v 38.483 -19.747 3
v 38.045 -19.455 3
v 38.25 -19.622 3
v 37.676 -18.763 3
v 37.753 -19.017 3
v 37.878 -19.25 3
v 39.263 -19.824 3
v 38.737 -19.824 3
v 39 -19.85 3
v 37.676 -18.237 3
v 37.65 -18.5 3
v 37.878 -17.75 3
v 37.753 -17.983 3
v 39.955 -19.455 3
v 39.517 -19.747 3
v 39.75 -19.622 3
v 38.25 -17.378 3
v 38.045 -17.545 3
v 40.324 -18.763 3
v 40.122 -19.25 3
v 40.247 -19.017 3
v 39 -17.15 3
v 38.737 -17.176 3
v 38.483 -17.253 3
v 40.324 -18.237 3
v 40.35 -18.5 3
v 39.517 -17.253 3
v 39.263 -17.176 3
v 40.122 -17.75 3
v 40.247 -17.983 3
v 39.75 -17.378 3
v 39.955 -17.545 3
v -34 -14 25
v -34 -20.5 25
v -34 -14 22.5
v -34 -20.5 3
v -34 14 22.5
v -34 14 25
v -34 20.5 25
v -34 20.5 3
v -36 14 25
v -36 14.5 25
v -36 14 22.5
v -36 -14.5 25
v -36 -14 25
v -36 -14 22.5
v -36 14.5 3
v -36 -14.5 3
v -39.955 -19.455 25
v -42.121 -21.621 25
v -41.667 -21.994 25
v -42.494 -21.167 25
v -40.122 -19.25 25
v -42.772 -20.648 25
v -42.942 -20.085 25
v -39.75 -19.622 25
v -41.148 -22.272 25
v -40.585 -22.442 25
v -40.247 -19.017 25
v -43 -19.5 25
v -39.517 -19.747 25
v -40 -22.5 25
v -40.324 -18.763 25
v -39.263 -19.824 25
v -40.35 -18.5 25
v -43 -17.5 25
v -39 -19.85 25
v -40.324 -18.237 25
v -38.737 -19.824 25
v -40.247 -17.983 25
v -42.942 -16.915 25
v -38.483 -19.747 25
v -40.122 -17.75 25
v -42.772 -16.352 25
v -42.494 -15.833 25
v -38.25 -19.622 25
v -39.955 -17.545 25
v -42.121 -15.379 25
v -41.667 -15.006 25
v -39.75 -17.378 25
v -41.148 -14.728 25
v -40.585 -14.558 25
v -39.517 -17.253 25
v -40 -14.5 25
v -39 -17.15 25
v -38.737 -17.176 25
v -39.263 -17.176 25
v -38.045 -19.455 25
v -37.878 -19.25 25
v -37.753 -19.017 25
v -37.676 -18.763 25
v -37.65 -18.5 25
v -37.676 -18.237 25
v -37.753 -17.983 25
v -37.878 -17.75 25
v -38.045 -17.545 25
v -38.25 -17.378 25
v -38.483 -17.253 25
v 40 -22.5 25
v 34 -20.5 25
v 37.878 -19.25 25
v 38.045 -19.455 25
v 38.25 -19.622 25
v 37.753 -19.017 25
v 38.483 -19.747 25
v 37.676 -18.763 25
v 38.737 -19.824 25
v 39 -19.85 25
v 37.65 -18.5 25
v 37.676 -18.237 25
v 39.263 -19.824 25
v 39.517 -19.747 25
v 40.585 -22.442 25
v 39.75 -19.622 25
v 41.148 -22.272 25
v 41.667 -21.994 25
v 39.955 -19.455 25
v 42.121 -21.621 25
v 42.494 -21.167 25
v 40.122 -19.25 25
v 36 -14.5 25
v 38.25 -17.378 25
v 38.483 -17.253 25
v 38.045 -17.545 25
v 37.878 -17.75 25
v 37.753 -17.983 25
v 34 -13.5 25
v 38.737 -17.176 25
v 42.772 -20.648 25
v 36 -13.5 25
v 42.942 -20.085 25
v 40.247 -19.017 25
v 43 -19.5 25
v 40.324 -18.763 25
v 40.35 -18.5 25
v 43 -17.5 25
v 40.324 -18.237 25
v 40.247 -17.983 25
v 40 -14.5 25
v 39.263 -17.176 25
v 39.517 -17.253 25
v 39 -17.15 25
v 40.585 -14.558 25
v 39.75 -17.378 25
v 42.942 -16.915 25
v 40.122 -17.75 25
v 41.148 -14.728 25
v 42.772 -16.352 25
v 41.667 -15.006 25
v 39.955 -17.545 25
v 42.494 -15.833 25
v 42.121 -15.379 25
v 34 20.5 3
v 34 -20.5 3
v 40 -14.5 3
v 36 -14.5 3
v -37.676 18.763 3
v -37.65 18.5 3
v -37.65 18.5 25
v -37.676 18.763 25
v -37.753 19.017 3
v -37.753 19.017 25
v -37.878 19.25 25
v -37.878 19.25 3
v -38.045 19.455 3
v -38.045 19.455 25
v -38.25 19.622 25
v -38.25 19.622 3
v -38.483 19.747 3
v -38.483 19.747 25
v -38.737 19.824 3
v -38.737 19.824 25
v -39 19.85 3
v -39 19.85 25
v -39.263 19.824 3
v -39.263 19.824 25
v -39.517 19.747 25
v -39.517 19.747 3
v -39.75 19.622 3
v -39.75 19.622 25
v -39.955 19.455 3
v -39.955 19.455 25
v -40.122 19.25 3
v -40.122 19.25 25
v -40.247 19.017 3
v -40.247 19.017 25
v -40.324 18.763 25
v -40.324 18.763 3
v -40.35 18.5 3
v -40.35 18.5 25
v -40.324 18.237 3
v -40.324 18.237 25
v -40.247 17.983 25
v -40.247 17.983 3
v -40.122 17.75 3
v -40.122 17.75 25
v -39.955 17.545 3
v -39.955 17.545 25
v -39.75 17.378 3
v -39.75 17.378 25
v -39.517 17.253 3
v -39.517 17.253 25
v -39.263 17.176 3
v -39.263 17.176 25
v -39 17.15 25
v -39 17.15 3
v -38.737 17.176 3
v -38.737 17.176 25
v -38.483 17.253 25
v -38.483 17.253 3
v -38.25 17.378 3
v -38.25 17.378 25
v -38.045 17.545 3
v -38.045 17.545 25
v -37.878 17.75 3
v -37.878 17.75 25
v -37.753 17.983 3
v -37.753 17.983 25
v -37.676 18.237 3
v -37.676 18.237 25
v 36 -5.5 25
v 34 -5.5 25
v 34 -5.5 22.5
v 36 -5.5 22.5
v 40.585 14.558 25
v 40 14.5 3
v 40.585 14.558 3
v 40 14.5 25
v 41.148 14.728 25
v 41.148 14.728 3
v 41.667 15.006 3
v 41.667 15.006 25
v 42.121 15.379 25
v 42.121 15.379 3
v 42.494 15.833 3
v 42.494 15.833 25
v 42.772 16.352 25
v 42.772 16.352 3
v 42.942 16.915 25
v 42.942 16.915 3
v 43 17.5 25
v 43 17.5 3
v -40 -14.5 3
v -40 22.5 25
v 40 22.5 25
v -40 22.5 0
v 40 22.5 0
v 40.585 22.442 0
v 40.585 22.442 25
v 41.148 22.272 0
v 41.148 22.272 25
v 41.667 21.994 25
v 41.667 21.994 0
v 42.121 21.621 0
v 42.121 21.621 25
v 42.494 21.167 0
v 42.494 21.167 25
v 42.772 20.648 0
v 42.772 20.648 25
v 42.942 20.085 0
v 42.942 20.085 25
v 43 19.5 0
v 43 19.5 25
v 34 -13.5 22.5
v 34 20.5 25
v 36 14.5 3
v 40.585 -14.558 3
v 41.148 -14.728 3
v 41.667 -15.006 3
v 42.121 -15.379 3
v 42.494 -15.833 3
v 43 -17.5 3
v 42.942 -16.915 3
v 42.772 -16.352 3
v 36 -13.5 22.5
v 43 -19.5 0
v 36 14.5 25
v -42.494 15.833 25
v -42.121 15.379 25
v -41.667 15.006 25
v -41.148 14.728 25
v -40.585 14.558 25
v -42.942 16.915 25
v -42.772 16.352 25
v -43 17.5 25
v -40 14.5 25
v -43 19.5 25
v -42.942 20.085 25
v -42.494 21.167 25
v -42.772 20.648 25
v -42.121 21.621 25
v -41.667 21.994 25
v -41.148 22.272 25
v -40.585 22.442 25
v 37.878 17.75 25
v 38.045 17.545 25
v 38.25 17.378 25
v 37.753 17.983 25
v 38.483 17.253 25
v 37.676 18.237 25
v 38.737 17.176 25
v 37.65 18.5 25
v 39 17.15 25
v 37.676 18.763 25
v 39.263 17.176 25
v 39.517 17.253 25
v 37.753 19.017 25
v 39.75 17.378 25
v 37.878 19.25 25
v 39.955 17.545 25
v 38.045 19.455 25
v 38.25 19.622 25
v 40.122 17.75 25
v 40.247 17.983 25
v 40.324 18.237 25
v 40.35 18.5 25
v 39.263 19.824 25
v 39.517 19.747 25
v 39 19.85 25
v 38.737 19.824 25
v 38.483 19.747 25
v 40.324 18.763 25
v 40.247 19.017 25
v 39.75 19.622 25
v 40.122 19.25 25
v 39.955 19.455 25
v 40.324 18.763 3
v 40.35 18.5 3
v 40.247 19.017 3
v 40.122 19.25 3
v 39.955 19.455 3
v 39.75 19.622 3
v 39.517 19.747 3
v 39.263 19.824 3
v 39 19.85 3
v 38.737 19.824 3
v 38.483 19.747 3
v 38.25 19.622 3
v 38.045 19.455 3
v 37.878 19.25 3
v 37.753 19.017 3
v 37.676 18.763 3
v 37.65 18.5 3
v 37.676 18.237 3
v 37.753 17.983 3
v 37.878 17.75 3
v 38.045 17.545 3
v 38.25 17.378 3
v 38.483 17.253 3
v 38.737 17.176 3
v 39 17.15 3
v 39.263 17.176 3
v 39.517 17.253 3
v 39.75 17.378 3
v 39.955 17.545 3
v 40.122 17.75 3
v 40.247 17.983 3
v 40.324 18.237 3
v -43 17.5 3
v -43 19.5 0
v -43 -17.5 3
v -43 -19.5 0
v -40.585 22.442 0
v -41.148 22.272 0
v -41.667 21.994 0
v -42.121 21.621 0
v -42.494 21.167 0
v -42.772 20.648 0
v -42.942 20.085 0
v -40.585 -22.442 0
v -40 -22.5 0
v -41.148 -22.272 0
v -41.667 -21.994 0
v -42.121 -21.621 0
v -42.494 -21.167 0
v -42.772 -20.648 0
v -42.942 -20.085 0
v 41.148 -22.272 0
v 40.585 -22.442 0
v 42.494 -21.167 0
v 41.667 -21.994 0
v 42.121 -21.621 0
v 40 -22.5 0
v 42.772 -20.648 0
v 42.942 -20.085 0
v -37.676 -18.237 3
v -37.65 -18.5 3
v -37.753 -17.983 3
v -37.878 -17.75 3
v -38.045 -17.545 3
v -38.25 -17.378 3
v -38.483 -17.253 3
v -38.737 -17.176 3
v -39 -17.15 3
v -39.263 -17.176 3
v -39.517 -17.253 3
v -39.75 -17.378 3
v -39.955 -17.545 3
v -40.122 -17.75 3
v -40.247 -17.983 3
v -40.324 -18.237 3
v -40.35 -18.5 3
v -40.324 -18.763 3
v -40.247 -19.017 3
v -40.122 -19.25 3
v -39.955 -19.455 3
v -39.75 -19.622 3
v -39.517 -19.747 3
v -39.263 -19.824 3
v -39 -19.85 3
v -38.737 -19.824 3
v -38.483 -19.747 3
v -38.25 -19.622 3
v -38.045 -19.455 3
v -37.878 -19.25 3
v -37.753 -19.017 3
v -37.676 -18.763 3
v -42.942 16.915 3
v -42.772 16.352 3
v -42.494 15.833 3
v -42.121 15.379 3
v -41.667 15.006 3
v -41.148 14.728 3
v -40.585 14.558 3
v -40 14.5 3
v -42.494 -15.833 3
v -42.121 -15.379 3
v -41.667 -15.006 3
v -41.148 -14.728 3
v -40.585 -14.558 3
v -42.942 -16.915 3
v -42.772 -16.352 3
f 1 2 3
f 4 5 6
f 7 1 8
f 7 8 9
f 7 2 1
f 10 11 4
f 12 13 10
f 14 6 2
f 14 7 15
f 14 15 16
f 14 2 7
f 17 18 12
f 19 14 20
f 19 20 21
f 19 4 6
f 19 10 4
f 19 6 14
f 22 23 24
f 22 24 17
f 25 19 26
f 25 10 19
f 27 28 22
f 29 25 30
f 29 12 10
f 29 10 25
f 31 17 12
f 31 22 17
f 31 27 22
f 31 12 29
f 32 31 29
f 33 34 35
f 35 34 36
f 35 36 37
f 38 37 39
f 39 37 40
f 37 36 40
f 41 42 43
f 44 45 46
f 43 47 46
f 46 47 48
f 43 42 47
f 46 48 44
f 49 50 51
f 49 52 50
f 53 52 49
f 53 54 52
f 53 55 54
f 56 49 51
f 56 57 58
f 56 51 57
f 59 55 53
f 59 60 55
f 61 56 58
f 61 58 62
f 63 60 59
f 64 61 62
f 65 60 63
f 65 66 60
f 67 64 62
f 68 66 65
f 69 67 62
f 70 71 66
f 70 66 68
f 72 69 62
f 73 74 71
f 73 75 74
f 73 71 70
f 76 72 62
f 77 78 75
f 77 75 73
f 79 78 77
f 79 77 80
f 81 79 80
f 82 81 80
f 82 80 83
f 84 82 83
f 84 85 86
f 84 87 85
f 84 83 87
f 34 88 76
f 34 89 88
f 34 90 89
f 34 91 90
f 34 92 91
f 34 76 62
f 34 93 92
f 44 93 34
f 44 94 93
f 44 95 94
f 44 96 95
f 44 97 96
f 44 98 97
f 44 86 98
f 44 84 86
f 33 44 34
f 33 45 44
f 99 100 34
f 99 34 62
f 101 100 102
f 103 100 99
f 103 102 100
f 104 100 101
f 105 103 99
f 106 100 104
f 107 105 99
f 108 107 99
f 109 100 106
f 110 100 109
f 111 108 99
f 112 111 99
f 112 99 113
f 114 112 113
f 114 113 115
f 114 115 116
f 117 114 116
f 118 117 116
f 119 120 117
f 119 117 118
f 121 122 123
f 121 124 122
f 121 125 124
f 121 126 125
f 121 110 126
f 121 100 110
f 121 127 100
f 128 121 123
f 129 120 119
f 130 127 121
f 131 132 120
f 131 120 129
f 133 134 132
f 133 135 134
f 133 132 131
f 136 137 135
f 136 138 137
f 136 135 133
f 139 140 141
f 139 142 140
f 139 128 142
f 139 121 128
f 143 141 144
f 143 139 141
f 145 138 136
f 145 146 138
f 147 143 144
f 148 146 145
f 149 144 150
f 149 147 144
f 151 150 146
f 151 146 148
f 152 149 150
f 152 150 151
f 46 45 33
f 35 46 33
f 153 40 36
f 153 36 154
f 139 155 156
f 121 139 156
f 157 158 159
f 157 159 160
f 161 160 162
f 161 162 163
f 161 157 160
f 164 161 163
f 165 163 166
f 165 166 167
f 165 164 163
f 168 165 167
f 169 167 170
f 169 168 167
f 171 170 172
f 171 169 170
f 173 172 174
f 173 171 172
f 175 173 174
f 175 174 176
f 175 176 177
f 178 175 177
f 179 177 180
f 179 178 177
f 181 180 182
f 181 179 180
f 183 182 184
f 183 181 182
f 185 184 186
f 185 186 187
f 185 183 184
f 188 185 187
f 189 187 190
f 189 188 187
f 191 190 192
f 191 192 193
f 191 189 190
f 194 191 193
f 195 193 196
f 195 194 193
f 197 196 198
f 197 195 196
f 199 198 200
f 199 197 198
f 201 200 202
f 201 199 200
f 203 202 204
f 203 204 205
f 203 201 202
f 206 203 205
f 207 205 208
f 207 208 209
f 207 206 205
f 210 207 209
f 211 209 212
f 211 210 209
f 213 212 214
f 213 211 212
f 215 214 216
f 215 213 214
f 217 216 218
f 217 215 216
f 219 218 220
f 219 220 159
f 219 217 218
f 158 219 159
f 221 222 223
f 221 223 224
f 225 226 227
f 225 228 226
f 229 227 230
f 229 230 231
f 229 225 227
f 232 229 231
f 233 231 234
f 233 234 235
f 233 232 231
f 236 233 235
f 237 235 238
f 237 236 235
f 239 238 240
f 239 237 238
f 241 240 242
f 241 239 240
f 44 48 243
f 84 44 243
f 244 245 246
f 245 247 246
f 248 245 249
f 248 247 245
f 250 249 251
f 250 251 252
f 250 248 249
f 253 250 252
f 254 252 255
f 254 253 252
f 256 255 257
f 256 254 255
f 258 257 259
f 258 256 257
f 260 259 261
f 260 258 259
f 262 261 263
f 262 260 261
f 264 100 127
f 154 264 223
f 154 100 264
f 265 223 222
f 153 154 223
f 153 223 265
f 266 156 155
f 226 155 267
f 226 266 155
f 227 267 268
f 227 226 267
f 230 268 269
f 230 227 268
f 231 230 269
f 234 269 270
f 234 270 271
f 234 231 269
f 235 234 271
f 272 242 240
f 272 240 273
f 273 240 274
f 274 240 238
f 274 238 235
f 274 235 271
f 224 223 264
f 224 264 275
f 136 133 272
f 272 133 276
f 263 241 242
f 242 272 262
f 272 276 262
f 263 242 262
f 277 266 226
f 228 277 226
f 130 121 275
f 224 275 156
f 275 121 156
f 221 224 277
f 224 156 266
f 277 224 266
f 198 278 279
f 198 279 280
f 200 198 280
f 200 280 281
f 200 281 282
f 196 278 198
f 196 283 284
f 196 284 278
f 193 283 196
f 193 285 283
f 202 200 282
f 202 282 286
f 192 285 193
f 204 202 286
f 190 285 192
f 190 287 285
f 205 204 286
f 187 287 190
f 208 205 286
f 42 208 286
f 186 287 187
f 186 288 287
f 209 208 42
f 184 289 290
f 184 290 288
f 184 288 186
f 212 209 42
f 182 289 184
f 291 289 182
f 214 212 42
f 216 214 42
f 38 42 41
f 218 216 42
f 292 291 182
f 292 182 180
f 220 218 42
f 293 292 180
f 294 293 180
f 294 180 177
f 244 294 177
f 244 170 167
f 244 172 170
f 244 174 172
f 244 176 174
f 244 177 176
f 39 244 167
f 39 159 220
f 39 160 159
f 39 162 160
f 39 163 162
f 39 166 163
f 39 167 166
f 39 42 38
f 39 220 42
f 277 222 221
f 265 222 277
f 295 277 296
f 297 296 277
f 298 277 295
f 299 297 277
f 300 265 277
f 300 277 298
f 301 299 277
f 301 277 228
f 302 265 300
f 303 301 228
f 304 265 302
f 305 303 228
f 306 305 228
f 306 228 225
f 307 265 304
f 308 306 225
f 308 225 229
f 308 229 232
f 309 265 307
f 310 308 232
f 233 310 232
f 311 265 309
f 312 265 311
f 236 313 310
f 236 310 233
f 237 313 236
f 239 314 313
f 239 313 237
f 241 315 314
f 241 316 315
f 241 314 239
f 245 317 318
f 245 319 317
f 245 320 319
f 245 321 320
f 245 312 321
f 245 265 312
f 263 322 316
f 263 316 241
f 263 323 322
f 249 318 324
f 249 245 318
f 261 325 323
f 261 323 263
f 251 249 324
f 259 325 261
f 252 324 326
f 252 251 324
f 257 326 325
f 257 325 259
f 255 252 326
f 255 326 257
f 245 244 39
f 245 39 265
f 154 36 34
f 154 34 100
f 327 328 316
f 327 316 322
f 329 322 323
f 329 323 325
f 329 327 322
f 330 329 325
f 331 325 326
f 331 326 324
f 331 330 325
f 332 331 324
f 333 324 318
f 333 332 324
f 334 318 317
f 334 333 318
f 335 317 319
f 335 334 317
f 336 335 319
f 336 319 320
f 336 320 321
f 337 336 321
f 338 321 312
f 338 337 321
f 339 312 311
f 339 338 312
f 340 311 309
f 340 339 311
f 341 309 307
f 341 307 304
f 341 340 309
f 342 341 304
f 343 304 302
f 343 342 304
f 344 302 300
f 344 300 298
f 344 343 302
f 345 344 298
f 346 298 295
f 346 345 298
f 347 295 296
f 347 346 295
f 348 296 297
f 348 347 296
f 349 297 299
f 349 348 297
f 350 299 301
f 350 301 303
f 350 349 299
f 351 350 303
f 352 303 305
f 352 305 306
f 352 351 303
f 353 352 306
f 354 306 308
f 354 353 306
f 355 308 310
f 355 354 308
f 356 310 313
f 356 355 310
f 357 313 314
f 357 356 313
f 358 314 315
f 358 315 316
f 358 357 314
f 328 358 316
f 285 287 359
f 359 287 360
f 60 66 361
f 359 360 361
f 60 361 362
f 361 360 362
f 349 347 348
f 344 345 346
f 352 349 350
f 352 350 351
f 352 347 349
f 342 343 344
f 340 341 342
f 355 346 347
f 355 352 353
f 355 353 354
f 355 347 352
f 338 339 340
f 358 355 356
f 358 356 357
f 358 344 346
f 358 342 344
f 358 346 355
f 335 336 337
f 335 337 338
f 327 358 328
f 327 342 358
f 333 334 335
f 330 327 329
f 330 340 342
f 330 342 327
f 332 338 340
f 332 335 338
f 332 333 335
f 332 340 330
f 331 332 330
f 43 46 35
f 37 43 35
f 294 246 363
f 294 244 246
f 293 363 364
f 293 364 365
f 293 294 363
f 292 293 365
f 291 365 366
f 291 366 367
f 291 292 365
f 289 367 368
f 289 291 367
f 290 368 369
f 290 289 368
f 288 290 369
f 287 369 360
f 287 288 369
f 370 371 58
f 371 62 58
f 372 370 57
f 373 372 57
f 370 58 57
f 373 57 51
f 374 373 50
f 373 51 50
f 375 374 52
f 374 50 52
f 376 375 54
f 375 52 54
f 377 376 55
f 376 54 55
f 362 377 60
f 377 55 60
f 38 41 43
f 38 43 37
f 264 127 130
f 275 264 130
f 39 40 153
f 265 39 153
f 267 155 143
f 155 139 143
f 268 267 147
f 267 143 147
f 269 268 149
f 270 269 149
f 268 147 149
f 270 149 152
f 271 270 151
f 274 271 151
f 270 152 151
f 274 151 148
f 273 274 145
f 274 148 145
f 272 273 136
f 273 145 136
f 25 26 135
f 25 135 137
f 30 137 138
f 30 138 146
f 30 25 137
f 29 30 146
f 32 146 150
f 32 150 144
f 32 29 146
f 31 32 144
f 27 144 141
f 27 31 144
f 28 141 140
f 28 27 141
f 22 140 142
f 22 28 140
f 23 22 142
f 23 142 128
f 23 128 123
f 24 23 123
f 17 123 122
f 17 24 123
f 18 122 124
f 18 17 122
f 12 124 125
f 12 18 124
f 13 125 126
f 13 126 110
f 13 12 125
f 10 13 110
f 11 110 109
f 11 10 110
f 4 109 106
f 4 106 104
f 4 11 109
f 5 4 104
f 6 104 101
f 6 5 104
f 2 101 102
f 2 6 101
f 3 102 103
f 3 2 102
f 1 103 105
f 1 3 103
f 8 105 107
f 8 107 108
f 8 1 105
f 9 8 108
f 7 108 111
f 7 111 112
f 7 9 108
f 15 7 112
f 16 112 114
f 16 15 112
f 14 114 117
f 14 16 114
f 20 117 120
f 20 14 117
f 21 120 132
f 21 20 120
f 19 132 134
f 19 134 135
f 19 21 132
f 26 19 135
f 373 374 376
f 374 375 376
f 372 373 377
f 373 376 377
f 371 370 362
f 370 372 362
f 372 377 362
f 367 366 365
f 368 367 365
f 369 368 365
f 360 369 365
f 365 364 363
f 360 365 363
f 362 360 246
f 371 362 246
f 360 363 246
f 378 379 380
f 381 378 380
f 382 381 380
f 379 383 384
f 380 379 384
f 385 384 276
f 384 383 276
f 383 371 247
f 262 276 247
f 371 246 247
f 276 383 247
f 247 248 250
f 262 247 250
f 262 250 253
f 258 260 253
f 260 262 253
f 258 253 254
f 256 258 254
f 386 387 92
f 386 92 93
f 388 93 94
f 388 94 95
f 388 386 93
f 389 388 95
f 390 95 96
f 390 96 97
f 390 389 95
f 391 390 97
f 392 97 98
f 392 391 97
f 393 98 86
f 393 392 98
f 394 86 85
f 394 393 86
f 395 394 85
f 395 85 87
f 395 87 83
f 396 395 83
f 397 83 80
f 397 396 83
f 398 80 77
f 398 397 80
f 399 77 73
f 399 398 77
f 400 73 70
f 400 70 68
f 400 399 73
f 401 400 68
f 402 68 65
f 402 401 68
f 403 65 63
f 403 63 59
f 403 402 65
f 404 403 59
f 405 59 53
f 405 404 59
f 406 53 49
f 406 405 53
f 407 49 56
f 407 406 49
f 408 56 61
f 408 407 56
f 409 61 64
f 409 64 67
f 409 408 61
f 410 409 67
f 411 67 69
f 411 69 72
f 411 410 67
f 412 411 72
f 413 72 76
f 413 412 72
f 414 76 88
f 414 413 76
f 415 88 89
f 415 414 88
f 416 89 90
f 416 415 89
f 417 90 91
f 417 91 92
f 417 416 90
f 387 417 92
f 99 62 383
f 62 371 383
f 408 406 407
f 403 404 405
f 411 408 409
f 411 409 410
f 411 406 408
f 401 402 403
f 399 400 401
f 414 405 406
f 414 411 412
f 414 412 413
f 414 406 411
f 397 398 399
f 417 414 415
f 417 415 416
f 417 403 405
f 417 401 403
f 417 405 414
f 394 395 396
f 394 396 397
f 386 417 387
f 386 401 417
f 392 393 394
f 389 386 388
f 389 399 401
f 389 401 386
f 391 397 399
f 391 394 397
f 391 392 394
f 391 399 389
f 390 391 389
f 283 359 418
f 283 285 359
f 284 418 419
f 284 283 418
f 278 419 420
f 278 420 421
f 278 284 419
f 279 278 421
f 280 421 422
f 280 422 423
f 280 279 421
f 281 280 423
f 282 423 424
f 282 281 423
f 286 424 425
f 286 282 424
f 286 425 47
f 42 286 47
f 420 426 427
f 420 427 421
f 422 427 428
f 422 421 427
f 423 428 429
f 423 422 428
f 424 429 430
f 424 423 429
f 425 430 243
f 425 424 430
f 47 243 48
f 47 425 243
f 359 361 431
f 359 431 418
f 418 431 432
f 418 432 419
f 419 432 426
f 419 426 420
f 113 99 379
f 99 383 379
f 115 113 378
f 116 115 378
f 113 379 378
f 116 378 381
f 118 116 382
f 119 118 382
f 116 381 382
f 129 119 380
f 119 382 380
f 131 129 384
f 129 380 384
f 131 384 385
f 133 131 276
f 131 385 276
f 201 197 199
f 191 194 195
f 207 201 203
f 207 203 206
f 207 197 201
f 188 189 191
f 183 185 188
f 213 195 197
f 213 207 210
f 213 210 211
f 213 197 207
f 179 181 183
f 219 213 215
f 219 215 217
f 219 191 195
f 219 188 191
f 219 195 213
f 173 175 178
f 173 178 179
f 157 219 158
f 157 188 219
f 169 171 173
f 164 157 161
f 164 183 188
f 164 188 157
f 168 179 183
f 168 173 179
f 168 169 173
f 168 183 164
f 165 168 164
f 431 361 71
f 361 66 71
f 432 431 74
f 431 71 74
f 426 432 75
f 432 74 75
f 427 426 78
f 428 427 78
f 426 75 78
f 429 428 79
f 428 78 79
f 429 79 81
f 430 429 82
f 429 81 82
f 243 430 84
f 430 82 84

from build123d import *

# Parameters (mm, degrees)
F0_W     = 86
F0_H     = 45
F1_DEPTH = 3
F2_R     = 1.35
F2_W     = 68
F2_H     = 41
F3_DEPTH = 22
F4_R     = 3
F5_W     = 2
F5_H     = 28
F5_H_2   = 8
F6_DEPTH = 2.5


# Not quite as in the source:
# - a feature names something its author has since deleted; it is built from what else it names


with BuildPart() as f1:
    # F0 (on Top) → F1 (new body)
    with BuildSketch(Plane.XY):
        Rectangle(F0_W, F0_H)
    extrude(amount=F1_DEPTH)

    # F2 (on face) → F3 (join)
    with BuildSketch(Plane.XY.offset(3)):
        Polygon((43, 22.5), (-43, 22.5), (-43, 14.5), (-36, 14.5), (-36, -14.5), (-43, -14.5), (-43, -22.5), (43, -22.5), (43, -14.5), (36, -14.5), (36, 14.5), (43, 14.5), align=None)
        with Locations((-39, -18.5)):
            Circle(F2_R, mode=Mode.SUBTRACT)
        with Locations((39, -18.5)):
            Circle(F2_R, mode=Mode.SUBTRACT)
        with Locations((-39, 18.5)):
            Circle(F2_R, mode=Mode.SUBTRACT)
        Rectangle(F2_W, F2_H, mode=Mode.SUBTRACT)
        with Locations((39, 18.5)):
            Circle(F2_R, mode=Mode.SUBTRACT)
    extrude(amount=F3_DEPTH)

    # F4
    f4_edges = [f1.edges().sort_by_distance(p)[0] for p in [
        (-43, -22.5, 12.5),
        (-43, 14.5, 14),
        (-43, 22.5, 12.5),
        (-43, -14.5, 14),
        (43, -22.5, 12.5),
        (43, -14.5, 14),
        (43, 14.5, 14),
        (43, 22.5, 12.5),
    ]]
    fillet(f4_edges, radius=F4_R)

    # F5 (on face) → F6 (cut)
    with BuildSketch(Plane.XY.offset(25)):
        with Locations((-35, 0)):
            Rectangle(F5_W, F5_H)
        with Locations((35, -9.5)):
            Rectangle(F5_W, F5_H_2)
    extrude(amount=-F6_DEPTH, mode=Mode.SUBTRACT)


solid = f1.part
